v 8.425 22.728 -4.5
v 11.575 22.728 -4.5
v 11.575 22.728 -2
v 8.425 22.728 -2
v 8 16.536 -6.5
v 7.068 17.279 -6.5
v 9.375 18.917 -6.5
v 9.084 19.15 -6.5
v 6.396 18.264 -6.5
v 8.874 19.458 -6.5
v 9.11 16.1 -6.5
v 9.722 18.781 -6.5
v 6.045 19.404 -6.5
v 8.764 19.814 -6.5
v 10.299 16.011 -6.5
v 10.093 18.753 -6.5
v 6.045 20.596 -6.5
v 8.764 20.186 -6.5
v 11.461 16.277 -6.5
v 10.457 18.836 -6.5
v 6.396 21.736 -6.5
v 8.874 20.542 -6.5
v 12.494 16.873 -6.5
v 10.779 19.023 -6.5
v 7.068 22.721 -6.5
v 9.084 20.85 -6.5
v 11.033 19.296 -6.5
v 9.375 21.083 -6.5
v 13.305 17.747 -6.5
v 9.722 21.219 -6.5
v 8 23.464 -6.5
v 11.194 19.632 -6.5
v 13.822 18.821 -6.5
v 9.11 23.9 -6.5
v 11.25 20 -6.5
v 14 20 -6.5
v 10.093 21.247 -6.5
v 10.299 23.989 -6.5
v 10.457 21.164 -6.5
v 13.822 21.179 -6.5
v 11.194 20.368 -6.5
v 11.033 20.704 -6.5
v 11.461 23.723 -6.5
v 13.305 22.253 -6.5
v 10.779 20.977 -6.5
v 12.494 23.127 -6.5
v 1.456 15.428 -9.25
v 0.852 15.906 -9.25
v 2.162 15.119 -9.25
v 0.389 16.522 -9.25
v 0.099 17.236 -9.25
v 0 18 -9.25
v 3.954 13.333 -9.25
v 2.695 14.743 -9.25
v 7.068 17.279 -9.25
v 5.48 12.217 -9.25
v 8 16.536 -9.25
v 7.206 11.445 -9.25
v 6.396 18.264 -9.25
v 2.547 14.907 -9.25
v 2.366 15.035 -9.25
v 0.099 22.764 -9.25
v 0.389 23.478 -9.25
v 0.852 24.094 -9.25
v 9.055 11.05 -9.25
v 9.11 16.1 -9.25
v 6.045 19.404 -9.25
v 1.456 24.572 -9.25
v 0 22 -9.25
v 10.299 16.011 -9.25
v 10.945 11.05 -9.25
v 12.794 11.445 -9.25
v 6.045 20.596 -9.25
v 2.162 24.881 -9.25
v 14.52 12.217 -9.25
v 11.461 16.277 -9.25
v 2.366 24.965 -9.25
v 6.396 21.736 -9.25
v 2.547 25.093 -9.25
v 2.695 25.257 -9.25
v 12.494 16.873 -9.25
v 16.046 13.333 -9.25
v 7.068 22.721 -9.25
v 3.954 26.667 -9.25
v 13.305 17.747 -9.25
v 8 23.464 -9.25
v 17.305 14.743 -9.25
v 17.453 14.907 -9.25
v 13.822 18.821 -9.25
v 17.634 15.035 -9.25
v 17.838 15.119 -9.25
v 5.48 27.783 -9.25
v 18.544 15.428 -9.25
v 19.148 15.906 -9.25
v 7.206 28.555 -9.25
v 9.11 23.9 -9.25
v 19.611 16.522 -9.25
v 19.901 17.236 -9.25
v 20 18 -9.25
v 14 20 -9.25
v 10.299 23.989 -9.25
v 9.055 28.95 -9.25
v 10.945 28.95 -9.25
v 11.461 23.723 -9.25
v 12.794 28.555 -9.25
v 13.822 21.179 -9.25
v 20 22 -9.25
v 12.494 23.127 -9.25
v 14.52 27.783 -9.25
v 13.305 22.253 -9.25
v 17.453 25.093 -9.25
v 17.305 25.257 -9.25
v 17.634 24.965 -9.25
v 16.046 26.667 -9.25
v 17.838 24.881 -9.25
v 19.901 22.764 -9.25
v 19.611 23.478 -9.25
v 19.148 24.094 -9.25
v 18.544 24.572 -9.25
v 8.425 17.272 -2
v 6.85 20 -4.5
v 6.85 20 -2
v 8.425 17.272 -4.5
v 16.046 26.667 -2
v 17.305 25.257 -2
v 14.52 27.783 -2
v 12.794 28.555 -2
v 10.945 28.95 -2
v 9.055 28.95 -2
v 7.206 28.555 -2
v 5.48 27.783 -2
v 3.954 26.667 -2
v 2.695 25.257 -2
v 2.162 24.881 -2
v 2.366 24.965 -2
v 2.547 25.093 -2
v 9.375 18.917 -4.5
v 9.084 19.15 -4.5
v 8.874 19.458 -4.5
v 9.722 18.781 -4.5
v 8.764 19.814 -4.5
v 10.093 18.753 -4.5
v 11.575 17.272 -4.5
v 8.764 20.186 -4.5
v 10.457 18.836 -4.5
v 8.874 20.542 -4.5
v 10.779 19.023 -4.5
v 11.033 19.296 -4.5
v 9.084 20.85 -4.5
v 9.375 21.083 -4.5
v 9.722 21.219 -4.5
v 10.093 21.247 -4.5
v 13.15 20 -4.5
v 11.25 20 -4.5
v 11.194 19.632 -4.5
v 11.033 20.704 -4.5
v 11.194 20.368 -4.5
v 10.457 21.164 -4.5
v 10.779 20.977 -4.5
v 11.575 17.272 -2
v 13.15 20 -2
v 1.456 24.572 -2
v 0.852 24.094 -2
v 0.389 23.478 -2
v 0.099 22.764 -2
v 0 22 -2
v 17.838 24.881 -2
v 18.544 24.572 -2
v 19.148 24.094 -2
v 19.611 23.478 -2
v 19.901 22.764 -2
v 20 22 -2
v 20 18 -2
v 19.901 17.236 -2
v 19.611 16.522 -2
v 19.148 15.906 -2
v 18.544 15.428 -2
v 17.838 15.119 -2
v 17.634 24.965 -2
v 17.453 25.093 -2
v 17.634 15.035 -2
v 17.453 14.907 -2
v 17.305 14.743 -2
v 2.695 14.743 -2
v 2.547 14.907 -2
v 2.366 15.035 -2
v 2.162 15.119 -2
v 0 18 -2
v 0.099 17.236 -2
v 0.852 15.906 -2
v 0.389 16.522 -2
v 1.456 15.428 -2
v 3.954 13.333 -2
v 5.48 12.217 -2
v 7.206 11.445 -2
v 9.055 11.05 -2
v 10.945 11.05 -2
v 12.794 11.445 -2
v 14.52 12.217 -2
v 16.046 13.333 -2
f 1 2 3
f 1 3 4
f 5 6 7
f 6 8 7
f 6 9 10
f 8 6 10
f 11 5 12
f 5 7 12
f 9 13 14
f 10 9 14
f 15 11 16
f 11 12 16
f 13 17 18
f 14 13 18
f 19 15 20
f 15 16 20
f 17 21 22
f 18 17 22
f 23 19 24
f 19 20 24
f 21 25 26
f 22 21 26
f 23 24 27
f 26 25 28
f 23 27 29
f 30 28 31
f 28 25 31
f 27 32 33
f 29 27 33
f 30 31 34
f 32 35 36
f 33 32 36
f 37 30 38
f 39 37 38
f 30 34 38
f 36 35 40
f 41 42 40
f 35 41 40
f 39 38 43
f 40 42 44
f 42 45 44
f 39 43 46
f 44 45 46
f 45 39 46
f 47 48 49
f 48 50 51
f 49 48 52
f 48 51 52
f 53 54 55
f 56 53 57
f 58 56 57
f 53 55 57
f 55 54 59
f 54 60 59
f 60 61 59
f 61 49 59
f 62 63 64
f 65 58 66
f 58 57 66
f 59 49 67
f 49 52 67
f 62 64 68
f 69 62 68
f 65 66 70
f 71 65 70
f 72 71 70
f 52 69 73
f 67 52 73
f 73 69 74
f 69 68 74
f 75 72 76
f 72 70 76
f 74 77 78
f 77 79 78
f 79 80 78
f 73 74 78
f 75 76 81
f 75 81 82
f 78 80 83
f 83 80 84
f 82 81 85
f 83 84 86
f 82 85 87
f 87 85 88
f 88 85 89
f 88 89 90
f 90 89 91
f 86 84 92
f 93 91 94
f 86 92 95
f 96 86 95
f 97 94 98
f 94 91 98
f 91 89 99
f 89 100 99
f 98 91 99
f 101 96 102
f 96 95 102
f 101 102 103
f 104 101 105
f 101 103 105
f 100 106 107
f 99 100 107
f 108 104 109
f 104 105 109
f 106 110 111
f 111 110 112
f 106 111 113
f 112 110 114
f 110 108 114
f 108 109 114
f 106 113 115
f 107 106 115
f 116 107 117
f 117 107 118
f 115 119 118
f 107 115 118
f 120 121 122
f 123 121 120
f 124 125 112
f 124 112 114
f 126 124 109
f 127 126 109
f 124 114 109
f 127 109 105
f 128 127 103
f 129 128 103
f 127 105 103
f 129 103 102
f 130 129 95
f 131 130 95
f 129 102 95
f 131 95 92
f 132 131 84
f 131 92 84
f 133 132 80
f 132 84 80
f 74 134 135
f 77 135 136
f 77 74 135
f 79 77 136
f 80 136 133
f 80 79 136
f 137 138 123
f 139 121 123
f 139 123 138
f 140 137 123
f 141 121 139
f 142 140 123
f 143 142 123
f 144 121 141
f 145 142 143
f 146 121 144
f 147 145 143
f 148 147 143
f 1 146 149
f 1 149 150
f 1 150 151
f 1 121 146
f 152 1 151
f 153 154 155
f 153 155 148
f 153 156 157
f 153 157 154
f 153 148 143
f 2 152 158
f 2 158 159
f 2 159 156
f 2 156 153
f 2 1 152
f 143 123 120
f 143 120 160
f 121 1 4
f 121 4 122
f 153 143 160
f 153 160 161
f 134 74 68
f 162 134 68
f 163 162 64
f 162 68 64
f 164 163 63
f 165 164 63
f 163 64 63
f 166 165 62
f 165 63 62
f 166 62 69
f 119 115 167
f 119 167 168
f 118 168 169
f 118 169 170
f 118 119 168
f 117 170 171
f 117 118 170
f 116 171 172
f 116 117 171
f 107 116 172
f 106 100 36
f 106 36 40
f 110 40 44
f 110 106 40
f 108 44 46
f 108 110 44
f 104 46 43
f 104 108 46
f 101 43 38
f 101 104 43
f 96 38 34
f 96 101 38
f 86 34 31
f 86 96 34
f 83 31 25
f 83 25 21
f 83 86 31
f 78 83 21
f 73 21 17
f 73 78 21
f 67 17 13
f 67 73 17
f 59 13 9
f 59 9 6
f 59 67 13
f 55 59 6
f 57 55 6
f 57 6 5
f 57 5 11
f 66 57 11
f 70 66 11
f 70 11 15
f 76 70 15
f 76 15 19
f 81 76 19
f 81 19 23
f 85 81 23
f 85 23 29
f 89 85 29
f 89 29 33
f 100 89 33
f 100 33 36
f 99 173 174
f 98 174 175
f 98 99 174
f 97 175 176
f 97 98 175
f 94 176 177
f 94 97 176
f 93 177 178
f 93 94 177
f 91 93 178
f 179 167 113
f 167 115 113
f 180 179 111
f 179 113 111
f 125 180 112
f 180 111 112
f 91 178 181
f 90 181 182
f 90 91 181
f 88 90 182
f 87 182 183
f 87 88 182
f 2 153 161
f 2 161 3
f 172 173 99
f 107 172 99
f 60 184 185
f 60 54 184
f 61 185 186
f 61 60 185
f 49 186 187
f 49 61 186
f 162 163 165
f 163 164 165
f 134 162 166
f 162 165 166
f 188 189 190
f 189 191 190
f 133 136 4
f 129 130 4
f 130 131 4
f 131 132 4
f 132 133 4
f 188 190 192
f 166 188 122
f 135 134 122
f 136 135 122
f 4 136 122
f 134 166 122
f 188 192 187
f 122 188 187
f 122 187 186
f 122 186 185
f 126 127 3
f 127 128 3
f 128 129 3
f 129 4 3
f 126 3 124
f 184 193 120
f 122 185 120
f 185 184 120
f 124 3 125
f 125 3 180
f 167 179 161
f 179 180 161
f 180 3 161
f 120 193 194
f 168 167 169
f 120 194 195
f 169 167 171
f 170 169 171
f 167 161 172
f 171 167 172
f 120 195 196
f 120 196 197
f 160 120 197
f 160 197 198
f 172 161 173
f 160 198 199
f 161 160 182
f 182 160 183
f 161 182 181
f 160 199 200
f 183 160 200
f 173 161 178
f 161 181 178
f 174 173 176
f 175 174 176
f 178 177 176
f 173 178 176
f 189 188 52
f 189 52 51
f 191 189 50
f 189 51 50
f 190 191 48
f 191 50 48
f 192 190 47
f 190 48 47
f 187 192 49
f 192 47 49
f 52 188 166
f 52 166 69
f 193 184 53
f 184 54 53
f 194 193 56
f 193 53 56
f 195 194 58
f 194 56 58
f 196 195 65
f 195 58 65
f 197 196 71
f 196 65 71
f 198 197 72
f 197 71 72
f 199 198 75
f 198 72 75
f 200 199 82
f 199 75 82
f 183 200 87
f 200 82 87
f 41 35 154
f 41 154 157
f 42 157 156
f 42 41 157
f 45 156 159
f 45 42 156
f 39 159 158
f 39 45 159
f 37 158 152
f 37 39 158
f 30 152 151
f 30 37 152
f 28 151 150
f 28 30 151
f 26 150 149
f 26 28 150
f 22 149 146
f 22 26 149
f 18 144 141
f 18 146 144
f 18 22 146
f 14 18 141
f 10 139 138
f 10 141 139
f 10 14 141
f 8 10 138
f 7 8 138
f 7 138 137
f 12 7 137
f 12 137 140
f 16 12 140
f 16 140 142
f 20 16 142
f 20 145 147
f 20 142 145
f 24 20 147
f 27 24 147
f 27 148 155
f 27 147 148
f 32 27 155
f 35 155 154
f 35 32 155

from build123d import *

# Parameters (mm, degrees)
CYLINDER014_R             = 4
CYLINDER014_DEPTH         = 10
CYLINDER013_R             = 1.25
CYLINDER013_DEPTH         = 50
PRISM002_DEPTH            = 2.5
BOX004_W                  = 20
BOX004_H                  = 7.25
BOX004_DEPTH              = 10
FILLET004_R               = 3
FILLET005_R               = 3
CYLINDER016_R             = 4
CYLINDER016_DEPTH         = 7.25
CYLINDER015_R             = 9
CYLINDER015_DEPTH         = 7.25
FILLET006_R               = 1
FILLET006_PLACEMENT_ANGLE = 90


with BuildPart() as cylinder013:
    # Cylinder014 → Cylinder014 (new body)
    with BuildSketch(Plane(origin=(0, -16, 22.5), x_dir=(1, 0, 0), z_dir=(0, -1, 0))):
        Circle(CYLINDER014_R)
    extrude(amount=CYLINDER014_DEPTH)


with BuildPart() as fusion004:
    # Cylinder013 → Cylinder013 (new body)
    with BuildSketch(Plane(origin=(0, -16, 22.5), x_dir=(1, 0, 0), z_dir=(0, -1, 0))):
        Circle(CYLINDER013_R)
    extrude(amount=CYLINDER013_DEPTH)

    # Fusion004: union Cylinder013
    add(cylinder013.part)


with BuildPart() as fusion004_1:
    # Fusion004 placement: moved
    add(fusion004.part.moved(Location((0, 57, 0))))


with BuildPart() as fusion005:
    # Prism002 → Prism002 (new body)
    with BuildSketch(Plane(origin=(0, 29, 22.5), x_dir=(1, 0, 0), z_dir=(0, -1, 0))):
        Polygon((3.15, 0), (1.575, 2.72798), (-1.575, 2.72798), (-3.15, 0), (-1.575, -2.72798), (1.575, -2.72798), align=None)
    extrude(amount=PRISM002_DEPTH)

    # Fusion005: union Fusion004
    add(fusion004_1.part)


with BuildPart() as fusion005_1:
    # Fusion005 placement: moved
    add(fusion005.part.moved(Location((0, -26.5, -5))))


with BuildPart() as fillet005:
    # Box004 → Box004 (new body)
    with BuildSketch(Plane(origin=(-10, 0, 12.5), x_dir=(1, 0, 0), z_dir=(0, 0, 1))):
        with Locations((10, 3.625)):
            Rectangle(BOX004_W, BOX004_H)
    extrude(amount=BOX004_DEPTH)

    # Cut012: cut Fusion005
    add(fusion005_1.part, mode=Mode.SUBTRACT)

    # Fillet004
    fillet004_edges = [fillet005.edges().sort_by_distance(p)[0] for p in [
        (10, 3.625, 22.5),
    ]]
    fillet(fillet004_edges, radius=FILLET004_R)

    # Fillet005
    fillet005_edges = [fillet005.edges().sort_by_distance(p)[0] for p in [
        (10, 3.625, 12.5),
        (-10, 3.625, 12.5),
        (-10, 3.625, 22.5),
    ]]
    fillet(fillet005_edges, radius=FILLET005_R)


with BuildPart() as cylinder015:
    # Cylinder016 → Cylinder016 (new body)
    with BuildSketch(Plane(origin=(0, 0, 17.5), x_dir=(1, 0, 0), z_dir=(0, -1, 0))):
        Circle(CYLINDER016_R)
    extrude(amount=CYLINDER016_DEPTH)


with BuildPart() as tornillos_para_metal:
    # Cylinder015 → Cylinder015 (new body)
    with BuildSketch(Plane(origin=(0, 0, 17.5), x_dir=(1, 0, 0), z_dir=(0, -1, 0))):
        Circle(CYLINDER015_R)
    extrude(amount=CYLINDER015_DEPTH)

    # Cut013: cut Cylinder015
    add(cylinder015.part, mode=Mode.SUBTRACT)


with BuildPart() as tornillos_para_metal_1:
    # Cut013 placement: moved
    add(tornillos_para_metal.part.moved(Location((0, 7.25, 0))))

    # Fusion006: union Fillet005
    add(fillet005.part)

    # Fillet006
    fillet006_edges = [tornillos_para_metal_1.edges().sort_by_distance(p)[0] for p in [
        (7.512605, 3.625, 22.455882),
        (7.512605, 3.625, 12.544118),
        (-7.512605, 3.625, 12.544118),
        (-7.512605, 3.625, 22.455882),
    ]]
    fillet(fillet006_edges, radius=FILLET006_R)


with BuildPart() as tornillos_para_metal_2:
    # Fillet006 placement: moved
    add(tornillos_para_metal_1.part.moved(Location((10, 2.5, -2))).rotate(Axis((10, 2.5, -2), (-1, 0, 0)), FILLET006_PLACEMENT_ANGLE))


solid = tornillos_para_metal_2.part
